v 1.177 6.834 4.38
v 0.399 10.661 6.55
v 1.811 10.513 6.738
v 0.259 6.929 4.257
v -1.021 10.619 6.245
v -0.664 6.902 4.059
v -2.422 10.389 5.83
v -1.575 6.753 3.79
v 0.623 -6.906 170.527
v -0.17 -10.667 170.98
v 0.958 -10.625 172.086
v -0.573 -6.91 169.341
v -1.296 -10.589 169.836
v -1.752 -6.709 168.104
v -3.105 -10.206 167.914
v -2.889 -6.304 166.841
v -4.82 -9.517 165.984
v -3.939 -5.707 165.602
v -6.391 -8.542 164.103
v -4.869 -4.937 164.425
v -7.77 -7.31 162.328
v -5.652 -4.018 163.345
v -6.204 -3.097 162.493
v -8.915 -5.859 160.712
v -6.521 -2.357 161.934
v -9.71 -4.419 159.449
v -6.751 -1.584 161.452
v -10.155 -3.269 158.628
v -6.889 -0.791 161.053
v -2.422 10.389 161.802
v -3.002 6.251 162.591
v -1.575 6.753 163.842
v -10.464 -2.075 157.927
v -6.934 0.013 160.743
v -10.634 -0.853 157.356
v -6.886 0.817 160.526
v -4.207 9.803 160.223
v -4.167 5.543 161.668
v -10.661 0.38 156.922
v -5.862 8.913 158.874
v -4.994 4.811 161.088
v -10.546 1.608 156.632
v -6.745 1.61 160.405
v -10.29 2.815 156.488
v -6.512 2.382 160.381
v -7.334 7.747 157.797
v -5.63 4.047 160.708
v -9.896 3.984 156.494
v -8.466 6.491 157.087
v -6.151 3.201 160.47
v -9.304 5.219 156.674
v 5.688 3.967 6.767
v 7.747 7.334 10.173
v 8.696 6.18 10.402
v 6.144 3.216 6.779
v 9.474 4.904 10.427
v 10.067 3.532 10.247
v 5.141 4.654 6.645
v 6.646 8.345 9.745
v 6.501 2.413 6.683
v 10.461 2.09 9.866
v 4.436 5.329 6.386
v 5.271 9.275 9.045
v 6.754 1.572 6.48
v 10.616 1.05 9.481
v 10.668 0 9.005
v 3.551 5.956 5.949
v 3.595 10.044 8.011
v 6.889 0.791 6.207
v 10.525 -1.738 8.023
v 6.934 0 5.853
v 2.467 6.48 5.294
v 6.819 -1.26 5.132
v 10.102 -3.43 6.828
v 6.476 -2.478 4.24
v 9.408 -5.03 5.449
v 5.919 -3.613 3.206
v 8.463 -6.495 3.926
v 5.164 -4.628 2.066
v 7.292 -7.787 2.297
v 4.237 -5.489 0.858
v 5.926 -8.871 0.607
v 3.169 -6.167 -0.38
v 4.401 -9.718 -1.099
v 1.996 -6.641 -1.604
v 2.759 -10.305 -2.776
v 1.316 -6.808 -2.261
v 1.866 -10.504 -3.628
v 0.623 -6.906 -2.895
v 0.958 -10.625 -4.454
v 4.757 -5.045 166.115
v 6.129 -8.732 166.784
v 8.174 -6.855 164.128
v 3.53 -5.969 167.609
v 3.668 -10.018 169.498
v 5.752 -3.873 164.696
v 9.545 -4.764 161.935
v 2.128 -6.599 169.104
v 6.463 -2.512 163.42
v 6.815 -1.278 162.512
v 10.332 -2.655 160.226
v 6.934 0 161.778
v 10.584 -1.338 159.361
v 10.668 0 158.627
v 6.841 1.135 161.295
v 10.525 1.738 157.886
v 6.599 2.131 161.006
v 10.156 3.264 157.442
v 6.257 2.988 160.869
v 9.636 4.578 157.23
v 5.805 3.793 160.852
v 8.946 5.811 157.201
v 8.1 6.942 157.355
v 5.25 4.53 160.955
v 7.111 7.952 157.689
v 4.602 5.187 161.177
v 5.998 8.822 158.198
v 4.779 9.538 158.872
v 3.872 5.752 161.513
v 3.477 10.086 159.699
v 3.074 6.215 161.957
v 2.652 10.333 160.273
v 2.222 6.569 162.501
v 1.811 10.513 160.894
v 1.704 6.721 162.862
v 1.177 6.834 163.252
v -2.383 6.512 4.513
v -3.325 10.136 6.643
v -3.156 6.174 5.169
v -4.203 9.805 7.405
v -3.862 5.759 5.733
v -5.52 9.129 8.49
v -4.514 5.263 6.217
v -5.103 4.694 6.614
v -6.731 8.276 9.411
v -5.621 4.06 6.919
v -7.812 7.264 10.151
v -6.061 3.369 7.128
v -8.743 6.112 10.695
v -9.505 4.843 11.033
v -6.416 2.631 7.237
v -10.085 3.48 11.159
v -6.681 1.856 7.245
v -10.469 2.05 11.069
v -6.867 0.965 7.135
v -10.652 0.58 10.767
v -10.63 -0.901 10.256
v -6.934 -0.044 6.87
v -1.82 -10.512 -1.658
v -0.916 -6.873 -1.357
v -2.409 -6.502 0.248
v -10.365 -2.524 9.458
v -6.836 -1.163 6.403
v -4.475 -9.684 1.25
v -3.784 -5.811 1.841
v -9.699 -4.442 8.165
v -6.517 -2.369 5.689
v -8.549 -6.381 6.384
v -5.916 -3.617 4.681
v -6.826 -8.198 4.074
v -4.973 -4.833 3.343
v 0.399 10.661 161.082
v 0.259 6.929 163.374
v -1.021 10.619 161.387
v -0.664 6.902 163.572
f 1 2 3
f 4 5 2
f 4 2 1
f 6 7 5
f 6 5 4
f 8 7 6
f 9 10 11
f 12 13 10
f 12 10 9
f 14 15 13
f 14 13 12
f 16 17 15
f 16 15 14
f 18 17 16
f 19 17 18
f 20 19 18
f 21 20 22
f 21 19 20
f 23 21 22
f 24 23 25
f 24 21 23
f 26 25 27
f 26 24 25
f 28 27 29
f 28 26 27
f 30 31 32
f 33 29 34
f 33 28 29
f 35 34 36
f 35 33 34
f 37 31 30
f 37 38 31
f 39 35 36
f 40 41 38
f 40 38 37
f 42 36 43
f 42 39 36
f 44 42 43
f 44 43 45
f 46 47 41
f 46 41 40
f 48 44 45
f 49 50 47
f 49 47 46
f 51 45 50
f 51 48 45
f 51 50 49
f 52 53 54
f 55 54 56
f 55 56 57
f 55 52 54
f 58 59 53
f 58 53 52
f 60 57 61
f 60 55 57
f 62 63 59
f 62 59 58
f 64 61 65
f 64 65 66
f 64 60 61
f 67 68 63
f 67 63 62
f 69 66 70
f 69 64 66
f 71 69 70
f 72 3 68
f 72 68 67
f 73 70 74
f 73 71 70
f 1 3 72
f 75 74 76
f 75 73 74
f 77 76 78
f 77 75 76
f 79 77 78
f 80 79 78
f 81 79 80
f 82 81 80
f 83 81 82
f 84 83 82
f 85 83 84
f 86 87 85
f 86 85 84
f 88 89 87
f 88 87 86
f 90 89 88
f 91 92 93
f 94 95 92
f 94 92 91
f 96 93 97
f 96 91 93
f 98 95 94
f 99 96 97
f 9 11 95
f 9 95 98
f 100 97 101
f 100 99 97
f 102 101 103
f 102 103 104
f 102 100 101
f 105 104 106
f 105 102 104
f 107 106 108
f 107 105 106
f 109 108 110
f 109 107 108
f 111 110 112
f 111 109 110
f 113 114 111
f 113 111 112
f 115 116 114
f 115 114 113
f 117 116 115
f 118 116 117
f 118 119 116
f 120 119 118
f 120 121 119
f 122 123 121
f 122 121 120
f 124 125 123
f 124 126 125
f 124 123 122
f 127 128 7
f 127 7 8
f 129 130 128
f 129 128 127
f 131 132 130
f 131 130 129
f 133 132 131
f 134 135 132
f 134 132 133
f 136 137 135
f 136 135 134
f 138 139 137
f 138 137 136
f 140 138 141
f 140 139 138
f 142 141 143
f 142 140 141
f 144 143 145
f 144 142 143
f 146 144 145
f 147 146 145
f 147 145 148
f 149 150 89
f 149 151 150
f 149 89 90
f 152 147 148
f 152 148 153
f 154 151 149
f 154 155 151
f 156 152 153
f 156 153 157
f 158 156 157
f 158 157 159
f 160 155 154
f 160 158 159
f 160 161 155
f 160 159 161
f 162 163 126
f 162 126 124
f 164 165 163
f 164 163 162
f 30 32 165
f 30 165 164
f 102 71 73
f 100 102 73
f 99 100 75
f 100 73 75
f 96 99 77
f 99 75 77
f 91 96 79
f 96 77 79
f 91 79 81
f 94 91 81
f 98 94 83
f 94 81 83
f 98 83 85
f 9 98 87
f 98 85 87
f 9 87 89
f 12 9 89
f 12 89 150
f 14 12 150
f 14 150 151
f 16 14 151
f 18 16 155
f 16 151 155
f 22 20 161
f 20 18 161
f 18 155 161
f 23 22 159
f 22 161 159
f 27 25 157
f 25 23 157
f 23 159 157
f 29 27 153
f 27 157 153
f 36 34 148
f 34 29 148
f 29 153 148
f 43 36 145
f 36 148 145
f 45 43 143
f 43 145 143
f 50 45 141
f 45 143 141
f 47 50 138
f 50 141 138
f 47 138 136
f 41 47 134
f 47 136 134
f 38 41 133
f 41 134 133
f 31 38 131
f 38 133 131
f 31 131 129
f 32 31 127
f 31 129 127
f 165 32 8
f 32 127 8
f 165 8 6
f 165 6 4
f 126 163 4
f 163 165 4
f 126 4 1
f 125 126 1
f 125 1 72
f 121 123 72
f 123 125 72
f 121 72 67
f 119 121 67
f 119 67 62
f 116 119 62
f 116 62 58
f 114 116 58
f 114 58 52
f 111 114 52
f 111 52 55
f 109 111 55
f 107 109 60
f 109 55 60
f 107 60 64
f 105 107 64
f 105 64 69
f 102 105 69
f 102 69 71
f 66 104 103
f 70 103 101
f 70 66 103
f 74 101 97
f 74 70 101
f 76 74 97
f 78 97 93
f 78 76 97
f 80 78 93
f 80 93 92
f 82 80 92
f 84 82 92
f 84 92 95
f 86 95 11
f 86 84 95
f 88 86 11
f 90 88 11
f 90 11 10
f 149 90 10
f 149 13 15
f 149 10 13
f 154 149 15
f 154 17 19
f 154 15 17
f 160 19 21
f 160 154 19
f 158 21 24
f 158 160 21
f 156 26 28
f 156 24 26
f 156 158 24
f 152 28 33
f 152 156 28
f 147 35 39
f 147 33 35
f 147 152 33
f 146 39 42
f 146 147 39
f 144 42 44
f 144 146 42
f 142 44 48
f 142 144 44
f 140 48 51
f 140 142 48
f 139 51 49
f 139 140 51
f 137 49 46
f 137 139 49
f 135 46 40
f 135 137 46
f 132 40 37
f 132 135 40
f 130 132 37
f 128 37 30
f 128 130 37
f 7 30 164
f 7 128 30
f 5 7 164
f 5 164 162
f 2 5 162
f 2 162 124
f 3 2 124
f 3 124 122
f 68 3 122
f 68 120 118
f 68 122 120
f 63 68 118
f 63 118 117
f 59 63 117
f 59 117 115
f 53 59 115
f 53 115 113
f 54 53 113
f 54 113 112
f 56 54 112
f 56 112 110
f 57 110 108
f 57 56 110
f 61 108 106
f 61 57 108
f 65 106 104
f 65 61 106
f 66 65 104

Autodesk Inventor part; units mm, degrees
ref_plane "Start Plane" through (0, 0, -4.4541) normal (0, 0, 1) x (1, 0, 0)
ref_plane "End Plane" through (0, 0, 172.086) normal (0, 0, 1) x (1, 0, 0)
sketch "Sketch" plane through (0, 0, 0) normal (0, 0, 1) x (1, 0, 0)
  circle A0 centre (0, 0) radius 6.9342
  circle A1 centre (0, 0) radius 10.668
  dimension "d0" = 21.336
  dimension "d1" = 3.7338
extrude "Body" add sketch "Sketch" along normal up to surface (176.5401 mm away) from surface at -4.4541
sketch "Sketch3" plane through (0, 0, 0) normal (0, 0, 1) x (1, 0, 0)
  line L0 (0, 0) -> (10, 0)
ref_plane "Work Plane3" through (0, 0, 0) normal (0, -1, 0) x (1, 0, 0)
sketch "Sketch4" plane through (0, 0, 0) normal (0, -1, 0) x (1, 0, 0)
  line L0 (-2, -4.4541) -> (12, -4.4541)
  line L1 (-2, 172.086) -> (12, 172.086)
  dimension "d7" = 176.5401
ref_plane "Work Plane4" through (-9.2, -5.4006, 178.0712) normal (0.6032, 0.3541, 0.7147) x (0.7878, -0.1245, -0.6032)
split "Split1" plane through (-9.2, -5.4006, 178.0712) removes the side toward (0.6032, 0.3541, 0.7147)
ref_plane "Work Plane5" through (10.1246, -3.3615, 178.7912) normal (-0.686, 0.2278, 0.691) x (0.7217, 0.0924, 0.686)
split "Split2" plane through (10.1246, -3.3615, 178.7912) removes the side toward (-0.686, 0.2278, 0.691)
ref_plane "Work Plane6" through (-3.2893, -10.1482, 174.4387) normal (0.1659, 0.5117, 0.843) x (0.9851, -0.046, -0.1659)
split "Split3" plane through (-3.2893, -10.1482, 174.4387) removes the side toward (0.1659, 0.5117, 0.843)
ref_plane "Work Plane7" through (-9.2, -5.4006, -10.4394) normal (0.6032, 0.3541, -0.7147) x (-0.2753, -0.7486, -0.6032)
split "Split4" plane through (-9.2, -5.4006, -10.4394) removes the side toward (0.6032, 0.3541, -0.7147)
ref_plane "Work Plane8" through (10.1246, -3.3615, -11.1594) normal (-0.686, 0.2278, -0.691) x (-0.5231, 0.5057, 0.686)
split "Split5" plane through (10.1246, -3.3615, -11.1594) removes the side toward (-0.686, 0.2278, -0.691)
ref_plane "Work Plane9" through (-3.2893, -10.1482, -6.8069) normal (0.1659, 0.5117, -0.843) x (0.8248, -0.5406, -0.1659)
split "Split6" plane through (-3.2893, -10.1482, -6.8069) removes the side toward (0.1659, 0.5117, -0.843)
equation "\"d0\" = G_H"
equation "\"d1\" = G_T"
equation "\"d2\" = G_L"
equation "\"G_H\" = 21.336"
equation "\"G_T\" = 3.7338"
equation "\"G_L\" = 176.5401"
equation "\"G_OFFSET_START\" = 4.45413"
equation "\"G_OFFSET_END\" = 4.45413"
equation "\"d4\" = -G_OFFSET_START"
equation "\"d5\" = G_OFFSET_END + B_L"
equation "\"B_L\" = 167.63184"
properties part number "ANSI - 1/2 x 0.147 - 6.95" material "Steel, Mild"
